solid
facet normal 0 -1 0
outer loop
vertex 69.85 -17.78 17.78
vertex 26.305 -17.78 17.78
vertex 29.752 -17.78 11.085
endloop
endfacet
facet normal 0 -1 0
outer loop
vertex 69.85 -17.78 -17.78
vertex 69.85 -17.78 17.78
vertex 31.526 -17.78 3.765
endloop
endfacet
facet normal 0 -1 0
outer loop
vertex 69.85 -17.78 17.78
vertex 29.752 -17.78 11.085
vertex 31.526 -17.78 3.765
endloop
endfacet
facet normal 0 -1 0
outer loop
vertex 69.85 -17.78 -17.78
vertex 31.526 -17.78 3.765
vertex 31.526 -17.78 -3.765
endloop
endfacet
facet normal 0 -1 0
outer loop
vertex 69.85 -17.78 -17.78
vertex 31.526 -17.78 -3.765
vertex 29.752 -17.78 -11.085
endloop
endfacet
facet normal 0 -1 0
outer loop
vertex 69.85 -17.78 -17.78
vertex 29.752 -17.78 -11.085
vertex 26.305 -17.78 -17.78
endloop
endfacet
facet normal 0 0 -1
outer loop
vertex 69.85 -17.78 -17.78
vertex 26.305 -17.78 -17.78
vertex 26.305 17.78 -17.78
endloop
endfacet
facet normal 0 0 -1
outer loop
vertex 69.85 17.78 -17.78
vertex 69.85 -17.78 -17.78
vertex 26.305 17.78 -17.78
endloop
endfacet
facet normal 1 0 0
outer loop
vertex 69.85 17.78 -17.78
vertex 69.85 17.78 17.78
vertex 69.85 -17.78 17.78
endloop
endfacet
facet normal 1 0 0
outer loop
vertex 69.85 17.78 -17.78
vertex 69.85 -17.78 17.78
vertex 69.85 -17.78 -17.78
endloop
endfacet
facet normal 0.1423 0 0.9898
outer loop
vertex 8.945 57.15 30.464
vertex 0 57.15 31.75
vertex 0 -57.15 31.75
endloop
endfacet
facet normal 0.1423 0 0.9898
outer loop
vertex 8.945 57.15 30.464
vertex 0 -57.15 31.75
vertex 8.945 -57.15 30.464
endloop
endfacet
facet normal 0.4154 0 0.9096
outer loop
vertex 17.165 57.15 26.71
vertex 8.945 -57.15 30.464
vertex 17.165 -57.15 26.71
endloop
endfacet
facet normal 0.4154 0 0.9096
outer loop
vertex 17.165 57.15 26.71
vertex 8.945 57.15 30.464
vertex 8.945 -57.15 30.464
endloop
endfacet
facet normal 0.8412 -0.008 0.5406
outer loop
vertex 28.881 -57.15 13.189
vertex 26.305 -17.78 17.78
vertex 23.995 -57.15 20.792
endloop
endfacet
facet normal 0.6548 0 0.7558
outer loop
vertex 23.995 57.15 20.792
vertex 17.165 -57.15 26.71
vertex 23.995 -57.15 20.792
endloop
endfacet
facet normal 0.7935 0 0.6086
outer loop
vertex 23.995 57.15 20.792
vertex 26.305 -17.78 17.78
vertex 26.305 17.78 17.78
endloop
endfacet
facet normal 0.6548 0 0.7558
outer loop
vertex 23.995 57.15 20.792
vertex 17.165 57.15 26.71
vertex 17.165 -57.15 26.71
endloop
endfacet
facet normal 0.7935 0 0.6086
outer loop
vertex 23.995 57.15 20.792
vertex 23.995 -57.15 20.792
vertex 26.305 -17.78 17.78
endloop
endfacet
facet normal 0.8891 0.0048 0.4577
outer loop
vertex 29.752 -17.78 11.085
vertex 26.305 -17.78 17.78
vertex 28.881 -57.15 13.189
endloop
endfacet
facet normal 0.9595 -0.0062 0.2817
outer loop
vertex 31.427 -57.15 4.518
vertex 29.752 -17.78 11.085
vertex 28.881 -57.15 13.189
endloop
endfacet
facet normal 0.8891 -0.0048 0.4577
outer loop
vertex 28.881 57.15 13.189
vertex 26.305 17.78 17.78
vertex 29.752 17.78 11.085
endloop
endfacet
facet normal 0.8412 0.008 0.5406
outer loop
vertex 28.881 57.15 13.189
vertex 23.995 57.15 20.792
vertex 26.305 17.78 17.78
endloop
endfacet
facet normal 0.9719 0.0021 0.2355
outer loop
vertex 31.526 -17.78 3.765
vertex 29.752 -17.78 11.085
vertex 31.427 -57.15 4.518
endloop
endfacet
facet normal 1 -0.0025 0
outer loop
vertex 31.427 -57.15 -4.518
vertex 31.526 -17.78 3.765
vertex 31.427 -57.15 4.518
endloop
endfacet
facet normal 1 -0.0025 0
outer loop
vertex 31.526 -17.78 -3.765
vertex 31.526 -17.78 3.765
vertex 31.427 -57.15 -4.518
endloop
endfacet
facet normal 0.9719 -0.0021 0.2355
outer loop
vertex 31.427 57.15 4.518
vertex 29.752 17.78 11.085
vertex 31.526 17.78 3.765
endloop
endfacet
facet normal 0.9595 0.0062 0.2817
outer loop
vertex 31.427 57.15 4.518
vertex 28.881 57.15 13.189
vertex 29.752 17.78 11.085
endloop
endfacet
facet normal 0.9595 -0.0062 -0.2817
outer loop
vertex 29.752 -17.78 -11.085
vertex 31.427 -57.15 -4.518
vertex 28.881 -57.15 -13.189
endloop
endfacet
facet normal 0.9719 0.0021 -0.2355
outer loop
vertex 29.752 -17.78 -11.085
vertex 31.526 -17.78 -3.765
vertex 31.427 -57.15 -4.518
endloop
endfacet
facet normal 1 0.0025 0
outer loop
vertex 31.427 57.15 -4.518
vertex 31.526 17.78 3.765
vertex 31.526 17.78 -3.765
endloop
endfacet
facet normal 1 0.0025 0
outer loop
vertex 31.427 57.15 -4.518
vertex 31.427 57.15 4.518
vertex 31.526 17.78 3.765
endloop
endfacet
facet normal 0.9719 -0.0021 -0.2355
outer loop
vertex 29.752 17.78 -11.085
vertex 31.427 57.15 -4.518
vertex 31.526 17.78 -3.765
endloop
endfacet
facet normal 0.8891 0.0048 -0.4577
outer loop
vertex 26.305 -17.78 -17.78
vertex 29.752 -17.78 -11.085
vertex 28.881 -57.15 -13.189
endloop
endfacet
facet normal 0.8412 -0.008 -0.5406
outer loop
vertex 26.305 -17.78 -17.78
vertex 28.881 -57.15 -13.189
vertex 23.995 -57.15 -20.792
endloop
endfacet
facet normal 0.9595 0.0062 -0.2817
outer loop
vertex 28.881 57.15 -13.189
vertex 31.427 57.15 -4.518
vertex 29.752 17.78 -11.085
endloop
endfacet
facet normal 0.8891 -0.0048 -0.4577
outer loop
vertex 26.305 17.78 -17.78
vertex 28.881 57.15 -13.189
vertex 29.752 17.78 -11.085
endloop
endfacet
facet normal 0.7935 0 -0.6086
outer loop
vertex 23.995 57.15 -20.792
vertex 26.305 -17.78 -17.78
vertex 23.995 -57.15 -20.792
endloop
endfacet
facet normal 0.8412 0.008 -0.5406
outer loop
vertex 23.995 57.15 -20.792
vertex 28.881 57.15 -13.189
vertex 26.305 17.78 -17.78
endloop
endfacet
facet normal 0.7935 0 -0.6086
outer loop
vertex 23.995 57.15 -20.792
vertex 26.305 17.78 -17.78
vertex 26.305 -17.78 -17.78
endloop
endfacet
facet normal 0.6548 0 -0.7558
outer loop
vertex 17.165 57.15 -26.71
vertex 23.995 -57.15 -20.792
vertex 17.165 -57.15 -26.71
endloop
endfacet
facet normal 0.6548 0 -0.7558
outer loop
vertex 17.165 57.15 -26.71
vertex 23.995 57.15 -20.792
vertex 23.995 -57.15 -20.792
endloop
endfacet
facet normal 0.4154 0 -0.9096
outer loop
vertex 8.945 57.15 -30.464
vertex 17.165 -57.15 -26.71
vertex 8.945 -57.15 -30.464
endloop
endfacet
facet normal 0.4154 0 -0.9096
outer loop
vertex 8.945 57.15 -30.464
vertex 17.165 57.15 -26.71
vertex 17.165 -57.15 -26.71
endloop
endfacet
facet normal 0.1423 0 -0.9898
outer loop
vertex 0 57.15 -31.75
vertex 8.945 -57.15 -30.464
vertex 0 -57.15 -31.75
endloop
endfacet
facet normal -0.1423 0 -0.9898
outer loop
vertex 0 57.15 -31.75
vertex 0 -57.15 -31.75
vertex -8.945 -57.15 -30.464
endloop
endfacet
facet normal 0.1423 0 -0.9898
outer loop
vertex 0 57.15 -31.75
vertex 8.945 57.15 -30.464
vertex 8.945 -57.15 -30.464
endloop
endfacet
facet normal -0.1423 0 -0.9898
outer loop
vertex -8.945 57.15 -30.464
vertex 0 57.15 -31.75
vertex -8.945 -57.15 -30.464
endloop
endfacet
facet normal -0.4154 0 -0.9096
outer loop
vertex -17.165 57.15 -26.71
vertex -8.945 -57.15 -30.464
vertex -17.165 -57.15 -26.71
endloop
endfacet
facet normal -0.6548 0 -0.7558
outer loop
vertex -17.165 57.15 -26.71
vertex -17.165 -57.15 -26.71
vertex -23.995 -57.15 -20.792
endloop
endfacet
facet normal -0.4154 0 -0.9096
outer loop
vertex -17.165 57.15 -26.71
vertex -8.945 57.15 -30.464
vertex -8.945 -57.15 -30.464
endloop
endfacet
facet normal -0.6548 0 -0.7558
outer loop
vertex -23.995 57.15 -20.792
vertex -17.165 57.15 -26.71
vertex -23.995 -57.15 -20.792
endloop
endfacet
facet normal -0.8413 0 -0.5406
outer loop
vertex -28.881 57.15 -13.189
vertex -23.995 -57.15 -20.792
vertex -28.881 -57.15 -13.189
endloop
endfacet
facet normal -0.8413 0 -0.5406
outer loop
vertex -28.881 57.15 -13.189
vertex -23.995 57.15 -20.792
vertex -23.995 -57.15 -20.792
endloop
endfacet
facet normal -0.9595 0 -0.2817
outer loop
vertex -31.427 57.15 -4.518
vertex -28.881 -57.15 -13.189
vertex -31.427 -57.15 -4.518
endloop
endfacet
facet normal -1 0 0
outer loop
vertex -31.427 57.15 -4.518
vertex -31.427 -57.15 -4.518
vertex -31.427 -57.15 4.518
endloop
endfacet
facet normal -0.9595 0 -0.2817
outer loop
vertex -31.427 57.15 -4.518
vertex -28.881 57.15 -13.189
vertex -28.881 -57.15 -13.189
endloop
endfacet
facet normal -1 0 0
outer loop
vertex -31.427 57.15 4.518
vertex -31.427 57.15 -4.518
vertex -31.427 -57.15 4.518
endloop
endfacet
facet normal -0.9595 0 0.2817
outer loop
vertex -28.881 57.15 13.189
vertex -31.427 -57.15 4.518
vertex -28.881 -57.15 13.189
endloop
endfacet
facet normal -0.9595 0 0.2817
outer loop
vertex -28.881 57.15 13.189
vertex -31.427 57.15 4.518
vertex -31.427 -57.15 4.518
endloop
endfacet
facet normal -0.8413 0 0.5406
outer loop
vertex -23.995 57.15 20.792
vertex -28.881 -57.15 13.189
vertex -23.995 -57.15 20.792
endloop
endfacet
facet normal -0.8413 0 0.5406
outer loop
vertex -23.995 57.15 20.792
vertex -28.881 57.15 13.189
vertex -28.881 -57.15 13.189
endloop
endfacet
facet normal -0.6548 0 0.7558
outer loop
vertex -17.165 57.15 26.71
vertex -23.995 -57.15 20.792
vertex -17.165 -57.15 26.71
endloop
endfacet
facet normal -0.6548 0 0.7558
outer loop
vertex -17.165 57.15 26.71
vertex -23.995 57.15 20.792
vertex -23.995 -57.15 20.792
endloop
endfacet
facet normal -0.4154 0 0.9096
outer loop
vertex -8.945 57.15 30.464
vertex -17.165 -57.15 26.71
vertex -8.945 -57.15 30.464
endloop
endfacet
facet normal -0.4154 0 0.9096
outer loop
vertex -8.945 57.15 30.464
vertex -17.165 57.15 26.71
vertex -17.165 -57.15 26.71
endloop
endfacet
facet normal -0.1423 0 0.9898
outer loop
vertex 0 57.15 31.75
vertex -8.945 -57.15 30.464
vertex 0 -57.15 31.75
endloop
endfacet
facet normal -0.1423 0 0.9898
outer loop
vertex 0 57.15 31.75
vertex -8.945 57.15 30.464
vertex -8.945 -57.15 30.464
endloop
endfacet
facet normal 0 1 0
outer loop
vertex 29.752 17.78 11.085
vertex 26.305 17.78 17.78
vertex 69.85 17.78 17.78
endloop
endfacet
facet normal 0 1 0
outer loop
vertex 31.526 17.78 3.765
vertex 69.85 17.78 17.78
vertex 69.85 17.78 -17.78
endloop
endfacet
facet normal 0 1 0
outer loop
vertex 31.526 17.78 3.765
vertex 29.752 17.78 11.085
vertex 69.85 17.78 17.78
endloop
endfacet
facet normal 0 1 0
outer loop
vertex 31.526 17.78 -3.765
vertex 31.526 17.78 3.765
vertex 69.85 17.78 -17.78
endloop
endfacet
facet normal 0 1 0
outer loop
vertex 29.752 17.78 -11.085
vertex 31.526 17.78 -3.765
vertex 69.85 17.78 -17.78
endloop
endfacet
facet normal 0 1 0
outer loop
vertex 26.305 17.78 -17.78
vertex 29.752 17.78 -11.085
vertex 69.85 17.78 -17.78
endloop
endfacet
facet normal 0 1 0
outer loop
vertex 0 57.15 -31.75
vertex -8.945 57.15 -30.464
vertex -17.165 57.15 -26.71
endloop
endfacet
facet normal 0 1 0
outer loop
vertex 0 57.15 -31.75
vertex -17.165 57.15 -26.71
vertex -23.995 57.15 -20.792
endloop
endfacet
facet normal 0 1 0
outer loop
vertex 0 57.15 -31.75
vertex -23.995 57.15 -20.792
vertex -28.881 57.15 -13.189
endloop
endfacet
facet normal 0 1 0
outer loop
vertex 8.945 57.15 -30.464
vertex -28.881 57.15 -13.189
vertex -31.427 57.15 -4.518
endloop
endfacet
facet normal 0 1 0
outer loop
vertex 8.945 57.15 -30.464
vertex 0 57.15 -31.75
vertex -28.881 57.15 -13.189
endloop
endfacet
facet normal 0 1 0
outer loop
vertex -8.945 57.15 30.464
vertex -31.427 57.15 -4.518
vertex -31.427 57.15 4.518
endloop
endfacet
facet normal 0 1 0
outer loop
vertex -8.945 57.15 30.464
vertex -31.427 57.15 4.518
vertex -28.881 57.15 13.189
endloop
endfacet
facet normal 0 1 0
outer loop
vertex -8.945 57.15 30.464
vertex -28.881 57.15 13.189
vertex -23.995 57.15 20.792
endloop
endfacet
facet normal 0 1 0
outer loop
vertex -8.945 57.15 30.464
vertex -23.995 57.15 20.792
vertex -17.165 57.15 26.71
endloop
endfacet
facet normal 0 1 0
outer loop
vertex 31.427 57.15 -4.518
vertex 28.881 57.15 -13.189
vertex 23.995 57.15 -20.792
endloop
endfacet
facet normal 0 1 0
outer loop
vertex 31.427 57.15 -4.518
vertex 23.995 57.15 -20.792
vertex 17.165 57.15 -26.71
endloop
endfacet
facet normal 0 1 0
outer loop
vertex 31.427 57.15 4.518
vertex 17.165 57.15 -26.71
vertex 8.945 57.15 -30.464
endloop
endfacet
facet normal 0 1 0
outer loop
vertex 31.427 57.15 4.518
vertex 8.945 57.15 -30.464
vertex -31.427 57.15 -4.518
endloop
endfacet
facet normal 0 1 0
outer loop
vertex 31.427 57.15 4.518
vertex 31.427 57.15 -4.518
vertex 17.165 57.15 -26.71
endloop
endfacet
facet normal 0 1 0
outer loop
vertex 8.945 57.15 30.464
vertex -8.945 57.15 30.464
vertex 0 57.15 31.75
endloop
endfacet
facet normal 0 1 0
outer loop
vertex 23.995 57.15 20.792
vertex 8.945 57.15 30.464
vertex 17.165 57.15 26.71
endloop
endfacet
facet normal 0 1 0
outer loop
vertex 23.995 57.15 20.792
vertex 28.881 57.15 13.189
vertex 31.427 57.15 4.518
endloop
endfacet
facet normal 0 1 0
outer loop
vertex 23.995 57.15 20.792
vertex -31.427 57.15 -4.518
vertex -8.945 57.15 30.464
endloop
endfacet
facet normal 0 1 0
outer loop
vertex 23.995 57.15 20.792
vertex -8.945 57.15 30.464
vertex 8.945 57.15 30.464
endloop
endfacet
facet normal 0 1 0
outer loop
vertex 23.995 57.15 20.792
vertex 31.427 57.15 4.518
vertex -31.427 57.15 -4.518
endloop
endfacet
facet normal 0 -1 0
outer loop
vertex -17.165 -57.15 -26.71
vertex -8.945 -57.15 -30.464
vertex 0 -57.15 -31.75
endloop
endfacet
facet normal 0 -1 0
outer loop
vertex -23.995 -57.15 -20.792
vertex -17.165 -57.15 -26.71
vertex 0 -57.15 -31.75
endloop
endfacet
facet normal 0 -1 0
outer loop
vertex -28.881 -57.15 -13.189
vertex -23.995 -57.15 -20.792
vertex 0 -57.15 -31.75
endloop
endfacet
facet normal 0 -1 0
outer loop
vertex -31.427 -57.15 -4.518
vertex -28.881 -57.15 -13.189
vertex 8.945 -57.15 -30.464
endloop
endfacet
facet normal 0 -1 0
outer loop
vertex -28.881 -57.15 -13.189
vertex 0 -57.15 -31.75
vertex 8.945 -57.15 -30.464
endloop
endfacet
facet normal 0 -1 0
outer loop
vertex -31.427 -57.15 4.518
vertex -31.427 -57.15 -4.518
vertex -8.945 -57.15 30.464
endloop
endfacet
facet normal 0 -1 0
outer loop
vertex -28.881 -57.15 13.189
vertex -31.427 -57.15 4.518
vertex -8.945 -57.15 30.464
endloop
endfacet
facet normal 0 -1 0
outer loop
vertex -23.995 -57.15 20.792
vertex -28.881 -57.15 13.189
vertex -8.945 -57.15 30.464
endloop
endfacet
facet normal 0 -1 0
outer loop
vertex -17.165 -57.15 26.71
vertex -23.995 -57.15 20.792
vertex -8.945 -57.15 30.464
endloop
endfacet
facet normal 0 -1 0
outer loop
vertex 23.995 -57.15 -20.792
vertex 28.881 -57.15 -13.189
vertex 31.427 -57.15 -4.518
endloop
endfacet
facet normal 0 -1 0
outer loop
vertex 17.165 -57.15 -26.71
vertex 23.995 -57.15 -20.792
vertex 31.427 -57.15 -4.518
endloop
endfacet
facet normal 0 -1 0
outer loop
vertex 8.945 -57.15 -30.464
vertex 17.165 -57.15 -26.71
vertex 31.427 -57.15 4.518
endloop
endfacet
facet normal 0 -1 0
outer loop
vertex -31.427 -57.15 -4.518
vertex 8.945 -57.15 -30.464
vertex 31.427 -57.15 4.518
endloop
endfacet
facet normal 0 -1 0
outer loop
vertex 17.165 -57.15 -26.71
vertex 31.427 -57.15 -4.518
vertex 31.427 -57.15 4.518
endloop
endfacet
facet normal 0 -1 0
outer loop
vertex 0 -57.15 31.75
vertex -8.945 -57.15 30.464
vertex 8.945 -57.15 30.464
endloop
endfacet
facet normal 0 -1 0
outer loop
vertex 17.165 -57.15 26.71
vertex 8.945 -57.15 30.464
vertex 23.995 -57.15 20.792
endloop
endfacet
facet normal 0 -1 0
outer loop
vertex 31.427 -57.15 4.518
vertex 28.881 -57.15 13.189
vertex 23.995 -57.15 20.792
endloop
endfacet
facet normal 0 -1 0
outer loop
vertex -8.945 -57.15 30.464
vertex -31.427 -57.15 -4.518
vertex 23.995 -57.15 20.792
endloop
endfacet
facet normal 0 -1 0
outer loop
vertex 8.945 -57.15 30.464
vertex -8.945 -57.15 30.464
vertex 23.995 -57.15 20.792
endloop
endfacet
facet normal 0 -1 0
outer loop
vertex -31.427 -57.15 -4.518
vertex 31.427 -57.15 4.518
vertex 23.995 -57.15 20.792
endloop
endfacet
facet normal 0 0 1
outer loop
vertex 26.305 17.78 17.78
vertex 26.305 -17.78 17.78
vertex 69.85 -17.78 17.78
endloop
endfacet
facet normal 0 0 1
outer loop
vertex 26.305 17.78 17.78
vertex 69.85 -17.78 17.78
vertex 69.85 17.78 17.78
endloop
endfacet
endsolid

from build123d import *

# Parameters (mm, degrees)
SKETCH1_R           = 31.75
BOSS_EXTRUDE1_DEPTH = 57.15
SKETCH2_W           = 35.56
SKETCH2_H           = 35.56
BOSS_EXTRUDE2_DEPTH = 69.85


with BuildPart() as part:
    # Sketch1 → Boss-Extrude1 (new, symmetric)
    with BuildSketch(Plane(origin=(0, 0, 0), x_dir=(1, 0, 0), z_dir=(0, 1, 0))):
        with Locations(Location((0, 0, 0), (0, 0, 270))):
            Circle(SKETCH1_R)
    extrude(amount=BOSS_EXTRUDE1_DEPTH, both=True)

    # Sketch2 → Boss-Extrude2 (add)
    with BuildSketch(Plane(origin=(0, 0, 0), x_dir=(0, 0, -1), z_dir=(1, 0, 0))):
        Rectangle(SKETCH2_W, SKETCH2_H)
    extrude(amount=BOSS_EXTRUDE2_DEPTH)


solid = part.part
